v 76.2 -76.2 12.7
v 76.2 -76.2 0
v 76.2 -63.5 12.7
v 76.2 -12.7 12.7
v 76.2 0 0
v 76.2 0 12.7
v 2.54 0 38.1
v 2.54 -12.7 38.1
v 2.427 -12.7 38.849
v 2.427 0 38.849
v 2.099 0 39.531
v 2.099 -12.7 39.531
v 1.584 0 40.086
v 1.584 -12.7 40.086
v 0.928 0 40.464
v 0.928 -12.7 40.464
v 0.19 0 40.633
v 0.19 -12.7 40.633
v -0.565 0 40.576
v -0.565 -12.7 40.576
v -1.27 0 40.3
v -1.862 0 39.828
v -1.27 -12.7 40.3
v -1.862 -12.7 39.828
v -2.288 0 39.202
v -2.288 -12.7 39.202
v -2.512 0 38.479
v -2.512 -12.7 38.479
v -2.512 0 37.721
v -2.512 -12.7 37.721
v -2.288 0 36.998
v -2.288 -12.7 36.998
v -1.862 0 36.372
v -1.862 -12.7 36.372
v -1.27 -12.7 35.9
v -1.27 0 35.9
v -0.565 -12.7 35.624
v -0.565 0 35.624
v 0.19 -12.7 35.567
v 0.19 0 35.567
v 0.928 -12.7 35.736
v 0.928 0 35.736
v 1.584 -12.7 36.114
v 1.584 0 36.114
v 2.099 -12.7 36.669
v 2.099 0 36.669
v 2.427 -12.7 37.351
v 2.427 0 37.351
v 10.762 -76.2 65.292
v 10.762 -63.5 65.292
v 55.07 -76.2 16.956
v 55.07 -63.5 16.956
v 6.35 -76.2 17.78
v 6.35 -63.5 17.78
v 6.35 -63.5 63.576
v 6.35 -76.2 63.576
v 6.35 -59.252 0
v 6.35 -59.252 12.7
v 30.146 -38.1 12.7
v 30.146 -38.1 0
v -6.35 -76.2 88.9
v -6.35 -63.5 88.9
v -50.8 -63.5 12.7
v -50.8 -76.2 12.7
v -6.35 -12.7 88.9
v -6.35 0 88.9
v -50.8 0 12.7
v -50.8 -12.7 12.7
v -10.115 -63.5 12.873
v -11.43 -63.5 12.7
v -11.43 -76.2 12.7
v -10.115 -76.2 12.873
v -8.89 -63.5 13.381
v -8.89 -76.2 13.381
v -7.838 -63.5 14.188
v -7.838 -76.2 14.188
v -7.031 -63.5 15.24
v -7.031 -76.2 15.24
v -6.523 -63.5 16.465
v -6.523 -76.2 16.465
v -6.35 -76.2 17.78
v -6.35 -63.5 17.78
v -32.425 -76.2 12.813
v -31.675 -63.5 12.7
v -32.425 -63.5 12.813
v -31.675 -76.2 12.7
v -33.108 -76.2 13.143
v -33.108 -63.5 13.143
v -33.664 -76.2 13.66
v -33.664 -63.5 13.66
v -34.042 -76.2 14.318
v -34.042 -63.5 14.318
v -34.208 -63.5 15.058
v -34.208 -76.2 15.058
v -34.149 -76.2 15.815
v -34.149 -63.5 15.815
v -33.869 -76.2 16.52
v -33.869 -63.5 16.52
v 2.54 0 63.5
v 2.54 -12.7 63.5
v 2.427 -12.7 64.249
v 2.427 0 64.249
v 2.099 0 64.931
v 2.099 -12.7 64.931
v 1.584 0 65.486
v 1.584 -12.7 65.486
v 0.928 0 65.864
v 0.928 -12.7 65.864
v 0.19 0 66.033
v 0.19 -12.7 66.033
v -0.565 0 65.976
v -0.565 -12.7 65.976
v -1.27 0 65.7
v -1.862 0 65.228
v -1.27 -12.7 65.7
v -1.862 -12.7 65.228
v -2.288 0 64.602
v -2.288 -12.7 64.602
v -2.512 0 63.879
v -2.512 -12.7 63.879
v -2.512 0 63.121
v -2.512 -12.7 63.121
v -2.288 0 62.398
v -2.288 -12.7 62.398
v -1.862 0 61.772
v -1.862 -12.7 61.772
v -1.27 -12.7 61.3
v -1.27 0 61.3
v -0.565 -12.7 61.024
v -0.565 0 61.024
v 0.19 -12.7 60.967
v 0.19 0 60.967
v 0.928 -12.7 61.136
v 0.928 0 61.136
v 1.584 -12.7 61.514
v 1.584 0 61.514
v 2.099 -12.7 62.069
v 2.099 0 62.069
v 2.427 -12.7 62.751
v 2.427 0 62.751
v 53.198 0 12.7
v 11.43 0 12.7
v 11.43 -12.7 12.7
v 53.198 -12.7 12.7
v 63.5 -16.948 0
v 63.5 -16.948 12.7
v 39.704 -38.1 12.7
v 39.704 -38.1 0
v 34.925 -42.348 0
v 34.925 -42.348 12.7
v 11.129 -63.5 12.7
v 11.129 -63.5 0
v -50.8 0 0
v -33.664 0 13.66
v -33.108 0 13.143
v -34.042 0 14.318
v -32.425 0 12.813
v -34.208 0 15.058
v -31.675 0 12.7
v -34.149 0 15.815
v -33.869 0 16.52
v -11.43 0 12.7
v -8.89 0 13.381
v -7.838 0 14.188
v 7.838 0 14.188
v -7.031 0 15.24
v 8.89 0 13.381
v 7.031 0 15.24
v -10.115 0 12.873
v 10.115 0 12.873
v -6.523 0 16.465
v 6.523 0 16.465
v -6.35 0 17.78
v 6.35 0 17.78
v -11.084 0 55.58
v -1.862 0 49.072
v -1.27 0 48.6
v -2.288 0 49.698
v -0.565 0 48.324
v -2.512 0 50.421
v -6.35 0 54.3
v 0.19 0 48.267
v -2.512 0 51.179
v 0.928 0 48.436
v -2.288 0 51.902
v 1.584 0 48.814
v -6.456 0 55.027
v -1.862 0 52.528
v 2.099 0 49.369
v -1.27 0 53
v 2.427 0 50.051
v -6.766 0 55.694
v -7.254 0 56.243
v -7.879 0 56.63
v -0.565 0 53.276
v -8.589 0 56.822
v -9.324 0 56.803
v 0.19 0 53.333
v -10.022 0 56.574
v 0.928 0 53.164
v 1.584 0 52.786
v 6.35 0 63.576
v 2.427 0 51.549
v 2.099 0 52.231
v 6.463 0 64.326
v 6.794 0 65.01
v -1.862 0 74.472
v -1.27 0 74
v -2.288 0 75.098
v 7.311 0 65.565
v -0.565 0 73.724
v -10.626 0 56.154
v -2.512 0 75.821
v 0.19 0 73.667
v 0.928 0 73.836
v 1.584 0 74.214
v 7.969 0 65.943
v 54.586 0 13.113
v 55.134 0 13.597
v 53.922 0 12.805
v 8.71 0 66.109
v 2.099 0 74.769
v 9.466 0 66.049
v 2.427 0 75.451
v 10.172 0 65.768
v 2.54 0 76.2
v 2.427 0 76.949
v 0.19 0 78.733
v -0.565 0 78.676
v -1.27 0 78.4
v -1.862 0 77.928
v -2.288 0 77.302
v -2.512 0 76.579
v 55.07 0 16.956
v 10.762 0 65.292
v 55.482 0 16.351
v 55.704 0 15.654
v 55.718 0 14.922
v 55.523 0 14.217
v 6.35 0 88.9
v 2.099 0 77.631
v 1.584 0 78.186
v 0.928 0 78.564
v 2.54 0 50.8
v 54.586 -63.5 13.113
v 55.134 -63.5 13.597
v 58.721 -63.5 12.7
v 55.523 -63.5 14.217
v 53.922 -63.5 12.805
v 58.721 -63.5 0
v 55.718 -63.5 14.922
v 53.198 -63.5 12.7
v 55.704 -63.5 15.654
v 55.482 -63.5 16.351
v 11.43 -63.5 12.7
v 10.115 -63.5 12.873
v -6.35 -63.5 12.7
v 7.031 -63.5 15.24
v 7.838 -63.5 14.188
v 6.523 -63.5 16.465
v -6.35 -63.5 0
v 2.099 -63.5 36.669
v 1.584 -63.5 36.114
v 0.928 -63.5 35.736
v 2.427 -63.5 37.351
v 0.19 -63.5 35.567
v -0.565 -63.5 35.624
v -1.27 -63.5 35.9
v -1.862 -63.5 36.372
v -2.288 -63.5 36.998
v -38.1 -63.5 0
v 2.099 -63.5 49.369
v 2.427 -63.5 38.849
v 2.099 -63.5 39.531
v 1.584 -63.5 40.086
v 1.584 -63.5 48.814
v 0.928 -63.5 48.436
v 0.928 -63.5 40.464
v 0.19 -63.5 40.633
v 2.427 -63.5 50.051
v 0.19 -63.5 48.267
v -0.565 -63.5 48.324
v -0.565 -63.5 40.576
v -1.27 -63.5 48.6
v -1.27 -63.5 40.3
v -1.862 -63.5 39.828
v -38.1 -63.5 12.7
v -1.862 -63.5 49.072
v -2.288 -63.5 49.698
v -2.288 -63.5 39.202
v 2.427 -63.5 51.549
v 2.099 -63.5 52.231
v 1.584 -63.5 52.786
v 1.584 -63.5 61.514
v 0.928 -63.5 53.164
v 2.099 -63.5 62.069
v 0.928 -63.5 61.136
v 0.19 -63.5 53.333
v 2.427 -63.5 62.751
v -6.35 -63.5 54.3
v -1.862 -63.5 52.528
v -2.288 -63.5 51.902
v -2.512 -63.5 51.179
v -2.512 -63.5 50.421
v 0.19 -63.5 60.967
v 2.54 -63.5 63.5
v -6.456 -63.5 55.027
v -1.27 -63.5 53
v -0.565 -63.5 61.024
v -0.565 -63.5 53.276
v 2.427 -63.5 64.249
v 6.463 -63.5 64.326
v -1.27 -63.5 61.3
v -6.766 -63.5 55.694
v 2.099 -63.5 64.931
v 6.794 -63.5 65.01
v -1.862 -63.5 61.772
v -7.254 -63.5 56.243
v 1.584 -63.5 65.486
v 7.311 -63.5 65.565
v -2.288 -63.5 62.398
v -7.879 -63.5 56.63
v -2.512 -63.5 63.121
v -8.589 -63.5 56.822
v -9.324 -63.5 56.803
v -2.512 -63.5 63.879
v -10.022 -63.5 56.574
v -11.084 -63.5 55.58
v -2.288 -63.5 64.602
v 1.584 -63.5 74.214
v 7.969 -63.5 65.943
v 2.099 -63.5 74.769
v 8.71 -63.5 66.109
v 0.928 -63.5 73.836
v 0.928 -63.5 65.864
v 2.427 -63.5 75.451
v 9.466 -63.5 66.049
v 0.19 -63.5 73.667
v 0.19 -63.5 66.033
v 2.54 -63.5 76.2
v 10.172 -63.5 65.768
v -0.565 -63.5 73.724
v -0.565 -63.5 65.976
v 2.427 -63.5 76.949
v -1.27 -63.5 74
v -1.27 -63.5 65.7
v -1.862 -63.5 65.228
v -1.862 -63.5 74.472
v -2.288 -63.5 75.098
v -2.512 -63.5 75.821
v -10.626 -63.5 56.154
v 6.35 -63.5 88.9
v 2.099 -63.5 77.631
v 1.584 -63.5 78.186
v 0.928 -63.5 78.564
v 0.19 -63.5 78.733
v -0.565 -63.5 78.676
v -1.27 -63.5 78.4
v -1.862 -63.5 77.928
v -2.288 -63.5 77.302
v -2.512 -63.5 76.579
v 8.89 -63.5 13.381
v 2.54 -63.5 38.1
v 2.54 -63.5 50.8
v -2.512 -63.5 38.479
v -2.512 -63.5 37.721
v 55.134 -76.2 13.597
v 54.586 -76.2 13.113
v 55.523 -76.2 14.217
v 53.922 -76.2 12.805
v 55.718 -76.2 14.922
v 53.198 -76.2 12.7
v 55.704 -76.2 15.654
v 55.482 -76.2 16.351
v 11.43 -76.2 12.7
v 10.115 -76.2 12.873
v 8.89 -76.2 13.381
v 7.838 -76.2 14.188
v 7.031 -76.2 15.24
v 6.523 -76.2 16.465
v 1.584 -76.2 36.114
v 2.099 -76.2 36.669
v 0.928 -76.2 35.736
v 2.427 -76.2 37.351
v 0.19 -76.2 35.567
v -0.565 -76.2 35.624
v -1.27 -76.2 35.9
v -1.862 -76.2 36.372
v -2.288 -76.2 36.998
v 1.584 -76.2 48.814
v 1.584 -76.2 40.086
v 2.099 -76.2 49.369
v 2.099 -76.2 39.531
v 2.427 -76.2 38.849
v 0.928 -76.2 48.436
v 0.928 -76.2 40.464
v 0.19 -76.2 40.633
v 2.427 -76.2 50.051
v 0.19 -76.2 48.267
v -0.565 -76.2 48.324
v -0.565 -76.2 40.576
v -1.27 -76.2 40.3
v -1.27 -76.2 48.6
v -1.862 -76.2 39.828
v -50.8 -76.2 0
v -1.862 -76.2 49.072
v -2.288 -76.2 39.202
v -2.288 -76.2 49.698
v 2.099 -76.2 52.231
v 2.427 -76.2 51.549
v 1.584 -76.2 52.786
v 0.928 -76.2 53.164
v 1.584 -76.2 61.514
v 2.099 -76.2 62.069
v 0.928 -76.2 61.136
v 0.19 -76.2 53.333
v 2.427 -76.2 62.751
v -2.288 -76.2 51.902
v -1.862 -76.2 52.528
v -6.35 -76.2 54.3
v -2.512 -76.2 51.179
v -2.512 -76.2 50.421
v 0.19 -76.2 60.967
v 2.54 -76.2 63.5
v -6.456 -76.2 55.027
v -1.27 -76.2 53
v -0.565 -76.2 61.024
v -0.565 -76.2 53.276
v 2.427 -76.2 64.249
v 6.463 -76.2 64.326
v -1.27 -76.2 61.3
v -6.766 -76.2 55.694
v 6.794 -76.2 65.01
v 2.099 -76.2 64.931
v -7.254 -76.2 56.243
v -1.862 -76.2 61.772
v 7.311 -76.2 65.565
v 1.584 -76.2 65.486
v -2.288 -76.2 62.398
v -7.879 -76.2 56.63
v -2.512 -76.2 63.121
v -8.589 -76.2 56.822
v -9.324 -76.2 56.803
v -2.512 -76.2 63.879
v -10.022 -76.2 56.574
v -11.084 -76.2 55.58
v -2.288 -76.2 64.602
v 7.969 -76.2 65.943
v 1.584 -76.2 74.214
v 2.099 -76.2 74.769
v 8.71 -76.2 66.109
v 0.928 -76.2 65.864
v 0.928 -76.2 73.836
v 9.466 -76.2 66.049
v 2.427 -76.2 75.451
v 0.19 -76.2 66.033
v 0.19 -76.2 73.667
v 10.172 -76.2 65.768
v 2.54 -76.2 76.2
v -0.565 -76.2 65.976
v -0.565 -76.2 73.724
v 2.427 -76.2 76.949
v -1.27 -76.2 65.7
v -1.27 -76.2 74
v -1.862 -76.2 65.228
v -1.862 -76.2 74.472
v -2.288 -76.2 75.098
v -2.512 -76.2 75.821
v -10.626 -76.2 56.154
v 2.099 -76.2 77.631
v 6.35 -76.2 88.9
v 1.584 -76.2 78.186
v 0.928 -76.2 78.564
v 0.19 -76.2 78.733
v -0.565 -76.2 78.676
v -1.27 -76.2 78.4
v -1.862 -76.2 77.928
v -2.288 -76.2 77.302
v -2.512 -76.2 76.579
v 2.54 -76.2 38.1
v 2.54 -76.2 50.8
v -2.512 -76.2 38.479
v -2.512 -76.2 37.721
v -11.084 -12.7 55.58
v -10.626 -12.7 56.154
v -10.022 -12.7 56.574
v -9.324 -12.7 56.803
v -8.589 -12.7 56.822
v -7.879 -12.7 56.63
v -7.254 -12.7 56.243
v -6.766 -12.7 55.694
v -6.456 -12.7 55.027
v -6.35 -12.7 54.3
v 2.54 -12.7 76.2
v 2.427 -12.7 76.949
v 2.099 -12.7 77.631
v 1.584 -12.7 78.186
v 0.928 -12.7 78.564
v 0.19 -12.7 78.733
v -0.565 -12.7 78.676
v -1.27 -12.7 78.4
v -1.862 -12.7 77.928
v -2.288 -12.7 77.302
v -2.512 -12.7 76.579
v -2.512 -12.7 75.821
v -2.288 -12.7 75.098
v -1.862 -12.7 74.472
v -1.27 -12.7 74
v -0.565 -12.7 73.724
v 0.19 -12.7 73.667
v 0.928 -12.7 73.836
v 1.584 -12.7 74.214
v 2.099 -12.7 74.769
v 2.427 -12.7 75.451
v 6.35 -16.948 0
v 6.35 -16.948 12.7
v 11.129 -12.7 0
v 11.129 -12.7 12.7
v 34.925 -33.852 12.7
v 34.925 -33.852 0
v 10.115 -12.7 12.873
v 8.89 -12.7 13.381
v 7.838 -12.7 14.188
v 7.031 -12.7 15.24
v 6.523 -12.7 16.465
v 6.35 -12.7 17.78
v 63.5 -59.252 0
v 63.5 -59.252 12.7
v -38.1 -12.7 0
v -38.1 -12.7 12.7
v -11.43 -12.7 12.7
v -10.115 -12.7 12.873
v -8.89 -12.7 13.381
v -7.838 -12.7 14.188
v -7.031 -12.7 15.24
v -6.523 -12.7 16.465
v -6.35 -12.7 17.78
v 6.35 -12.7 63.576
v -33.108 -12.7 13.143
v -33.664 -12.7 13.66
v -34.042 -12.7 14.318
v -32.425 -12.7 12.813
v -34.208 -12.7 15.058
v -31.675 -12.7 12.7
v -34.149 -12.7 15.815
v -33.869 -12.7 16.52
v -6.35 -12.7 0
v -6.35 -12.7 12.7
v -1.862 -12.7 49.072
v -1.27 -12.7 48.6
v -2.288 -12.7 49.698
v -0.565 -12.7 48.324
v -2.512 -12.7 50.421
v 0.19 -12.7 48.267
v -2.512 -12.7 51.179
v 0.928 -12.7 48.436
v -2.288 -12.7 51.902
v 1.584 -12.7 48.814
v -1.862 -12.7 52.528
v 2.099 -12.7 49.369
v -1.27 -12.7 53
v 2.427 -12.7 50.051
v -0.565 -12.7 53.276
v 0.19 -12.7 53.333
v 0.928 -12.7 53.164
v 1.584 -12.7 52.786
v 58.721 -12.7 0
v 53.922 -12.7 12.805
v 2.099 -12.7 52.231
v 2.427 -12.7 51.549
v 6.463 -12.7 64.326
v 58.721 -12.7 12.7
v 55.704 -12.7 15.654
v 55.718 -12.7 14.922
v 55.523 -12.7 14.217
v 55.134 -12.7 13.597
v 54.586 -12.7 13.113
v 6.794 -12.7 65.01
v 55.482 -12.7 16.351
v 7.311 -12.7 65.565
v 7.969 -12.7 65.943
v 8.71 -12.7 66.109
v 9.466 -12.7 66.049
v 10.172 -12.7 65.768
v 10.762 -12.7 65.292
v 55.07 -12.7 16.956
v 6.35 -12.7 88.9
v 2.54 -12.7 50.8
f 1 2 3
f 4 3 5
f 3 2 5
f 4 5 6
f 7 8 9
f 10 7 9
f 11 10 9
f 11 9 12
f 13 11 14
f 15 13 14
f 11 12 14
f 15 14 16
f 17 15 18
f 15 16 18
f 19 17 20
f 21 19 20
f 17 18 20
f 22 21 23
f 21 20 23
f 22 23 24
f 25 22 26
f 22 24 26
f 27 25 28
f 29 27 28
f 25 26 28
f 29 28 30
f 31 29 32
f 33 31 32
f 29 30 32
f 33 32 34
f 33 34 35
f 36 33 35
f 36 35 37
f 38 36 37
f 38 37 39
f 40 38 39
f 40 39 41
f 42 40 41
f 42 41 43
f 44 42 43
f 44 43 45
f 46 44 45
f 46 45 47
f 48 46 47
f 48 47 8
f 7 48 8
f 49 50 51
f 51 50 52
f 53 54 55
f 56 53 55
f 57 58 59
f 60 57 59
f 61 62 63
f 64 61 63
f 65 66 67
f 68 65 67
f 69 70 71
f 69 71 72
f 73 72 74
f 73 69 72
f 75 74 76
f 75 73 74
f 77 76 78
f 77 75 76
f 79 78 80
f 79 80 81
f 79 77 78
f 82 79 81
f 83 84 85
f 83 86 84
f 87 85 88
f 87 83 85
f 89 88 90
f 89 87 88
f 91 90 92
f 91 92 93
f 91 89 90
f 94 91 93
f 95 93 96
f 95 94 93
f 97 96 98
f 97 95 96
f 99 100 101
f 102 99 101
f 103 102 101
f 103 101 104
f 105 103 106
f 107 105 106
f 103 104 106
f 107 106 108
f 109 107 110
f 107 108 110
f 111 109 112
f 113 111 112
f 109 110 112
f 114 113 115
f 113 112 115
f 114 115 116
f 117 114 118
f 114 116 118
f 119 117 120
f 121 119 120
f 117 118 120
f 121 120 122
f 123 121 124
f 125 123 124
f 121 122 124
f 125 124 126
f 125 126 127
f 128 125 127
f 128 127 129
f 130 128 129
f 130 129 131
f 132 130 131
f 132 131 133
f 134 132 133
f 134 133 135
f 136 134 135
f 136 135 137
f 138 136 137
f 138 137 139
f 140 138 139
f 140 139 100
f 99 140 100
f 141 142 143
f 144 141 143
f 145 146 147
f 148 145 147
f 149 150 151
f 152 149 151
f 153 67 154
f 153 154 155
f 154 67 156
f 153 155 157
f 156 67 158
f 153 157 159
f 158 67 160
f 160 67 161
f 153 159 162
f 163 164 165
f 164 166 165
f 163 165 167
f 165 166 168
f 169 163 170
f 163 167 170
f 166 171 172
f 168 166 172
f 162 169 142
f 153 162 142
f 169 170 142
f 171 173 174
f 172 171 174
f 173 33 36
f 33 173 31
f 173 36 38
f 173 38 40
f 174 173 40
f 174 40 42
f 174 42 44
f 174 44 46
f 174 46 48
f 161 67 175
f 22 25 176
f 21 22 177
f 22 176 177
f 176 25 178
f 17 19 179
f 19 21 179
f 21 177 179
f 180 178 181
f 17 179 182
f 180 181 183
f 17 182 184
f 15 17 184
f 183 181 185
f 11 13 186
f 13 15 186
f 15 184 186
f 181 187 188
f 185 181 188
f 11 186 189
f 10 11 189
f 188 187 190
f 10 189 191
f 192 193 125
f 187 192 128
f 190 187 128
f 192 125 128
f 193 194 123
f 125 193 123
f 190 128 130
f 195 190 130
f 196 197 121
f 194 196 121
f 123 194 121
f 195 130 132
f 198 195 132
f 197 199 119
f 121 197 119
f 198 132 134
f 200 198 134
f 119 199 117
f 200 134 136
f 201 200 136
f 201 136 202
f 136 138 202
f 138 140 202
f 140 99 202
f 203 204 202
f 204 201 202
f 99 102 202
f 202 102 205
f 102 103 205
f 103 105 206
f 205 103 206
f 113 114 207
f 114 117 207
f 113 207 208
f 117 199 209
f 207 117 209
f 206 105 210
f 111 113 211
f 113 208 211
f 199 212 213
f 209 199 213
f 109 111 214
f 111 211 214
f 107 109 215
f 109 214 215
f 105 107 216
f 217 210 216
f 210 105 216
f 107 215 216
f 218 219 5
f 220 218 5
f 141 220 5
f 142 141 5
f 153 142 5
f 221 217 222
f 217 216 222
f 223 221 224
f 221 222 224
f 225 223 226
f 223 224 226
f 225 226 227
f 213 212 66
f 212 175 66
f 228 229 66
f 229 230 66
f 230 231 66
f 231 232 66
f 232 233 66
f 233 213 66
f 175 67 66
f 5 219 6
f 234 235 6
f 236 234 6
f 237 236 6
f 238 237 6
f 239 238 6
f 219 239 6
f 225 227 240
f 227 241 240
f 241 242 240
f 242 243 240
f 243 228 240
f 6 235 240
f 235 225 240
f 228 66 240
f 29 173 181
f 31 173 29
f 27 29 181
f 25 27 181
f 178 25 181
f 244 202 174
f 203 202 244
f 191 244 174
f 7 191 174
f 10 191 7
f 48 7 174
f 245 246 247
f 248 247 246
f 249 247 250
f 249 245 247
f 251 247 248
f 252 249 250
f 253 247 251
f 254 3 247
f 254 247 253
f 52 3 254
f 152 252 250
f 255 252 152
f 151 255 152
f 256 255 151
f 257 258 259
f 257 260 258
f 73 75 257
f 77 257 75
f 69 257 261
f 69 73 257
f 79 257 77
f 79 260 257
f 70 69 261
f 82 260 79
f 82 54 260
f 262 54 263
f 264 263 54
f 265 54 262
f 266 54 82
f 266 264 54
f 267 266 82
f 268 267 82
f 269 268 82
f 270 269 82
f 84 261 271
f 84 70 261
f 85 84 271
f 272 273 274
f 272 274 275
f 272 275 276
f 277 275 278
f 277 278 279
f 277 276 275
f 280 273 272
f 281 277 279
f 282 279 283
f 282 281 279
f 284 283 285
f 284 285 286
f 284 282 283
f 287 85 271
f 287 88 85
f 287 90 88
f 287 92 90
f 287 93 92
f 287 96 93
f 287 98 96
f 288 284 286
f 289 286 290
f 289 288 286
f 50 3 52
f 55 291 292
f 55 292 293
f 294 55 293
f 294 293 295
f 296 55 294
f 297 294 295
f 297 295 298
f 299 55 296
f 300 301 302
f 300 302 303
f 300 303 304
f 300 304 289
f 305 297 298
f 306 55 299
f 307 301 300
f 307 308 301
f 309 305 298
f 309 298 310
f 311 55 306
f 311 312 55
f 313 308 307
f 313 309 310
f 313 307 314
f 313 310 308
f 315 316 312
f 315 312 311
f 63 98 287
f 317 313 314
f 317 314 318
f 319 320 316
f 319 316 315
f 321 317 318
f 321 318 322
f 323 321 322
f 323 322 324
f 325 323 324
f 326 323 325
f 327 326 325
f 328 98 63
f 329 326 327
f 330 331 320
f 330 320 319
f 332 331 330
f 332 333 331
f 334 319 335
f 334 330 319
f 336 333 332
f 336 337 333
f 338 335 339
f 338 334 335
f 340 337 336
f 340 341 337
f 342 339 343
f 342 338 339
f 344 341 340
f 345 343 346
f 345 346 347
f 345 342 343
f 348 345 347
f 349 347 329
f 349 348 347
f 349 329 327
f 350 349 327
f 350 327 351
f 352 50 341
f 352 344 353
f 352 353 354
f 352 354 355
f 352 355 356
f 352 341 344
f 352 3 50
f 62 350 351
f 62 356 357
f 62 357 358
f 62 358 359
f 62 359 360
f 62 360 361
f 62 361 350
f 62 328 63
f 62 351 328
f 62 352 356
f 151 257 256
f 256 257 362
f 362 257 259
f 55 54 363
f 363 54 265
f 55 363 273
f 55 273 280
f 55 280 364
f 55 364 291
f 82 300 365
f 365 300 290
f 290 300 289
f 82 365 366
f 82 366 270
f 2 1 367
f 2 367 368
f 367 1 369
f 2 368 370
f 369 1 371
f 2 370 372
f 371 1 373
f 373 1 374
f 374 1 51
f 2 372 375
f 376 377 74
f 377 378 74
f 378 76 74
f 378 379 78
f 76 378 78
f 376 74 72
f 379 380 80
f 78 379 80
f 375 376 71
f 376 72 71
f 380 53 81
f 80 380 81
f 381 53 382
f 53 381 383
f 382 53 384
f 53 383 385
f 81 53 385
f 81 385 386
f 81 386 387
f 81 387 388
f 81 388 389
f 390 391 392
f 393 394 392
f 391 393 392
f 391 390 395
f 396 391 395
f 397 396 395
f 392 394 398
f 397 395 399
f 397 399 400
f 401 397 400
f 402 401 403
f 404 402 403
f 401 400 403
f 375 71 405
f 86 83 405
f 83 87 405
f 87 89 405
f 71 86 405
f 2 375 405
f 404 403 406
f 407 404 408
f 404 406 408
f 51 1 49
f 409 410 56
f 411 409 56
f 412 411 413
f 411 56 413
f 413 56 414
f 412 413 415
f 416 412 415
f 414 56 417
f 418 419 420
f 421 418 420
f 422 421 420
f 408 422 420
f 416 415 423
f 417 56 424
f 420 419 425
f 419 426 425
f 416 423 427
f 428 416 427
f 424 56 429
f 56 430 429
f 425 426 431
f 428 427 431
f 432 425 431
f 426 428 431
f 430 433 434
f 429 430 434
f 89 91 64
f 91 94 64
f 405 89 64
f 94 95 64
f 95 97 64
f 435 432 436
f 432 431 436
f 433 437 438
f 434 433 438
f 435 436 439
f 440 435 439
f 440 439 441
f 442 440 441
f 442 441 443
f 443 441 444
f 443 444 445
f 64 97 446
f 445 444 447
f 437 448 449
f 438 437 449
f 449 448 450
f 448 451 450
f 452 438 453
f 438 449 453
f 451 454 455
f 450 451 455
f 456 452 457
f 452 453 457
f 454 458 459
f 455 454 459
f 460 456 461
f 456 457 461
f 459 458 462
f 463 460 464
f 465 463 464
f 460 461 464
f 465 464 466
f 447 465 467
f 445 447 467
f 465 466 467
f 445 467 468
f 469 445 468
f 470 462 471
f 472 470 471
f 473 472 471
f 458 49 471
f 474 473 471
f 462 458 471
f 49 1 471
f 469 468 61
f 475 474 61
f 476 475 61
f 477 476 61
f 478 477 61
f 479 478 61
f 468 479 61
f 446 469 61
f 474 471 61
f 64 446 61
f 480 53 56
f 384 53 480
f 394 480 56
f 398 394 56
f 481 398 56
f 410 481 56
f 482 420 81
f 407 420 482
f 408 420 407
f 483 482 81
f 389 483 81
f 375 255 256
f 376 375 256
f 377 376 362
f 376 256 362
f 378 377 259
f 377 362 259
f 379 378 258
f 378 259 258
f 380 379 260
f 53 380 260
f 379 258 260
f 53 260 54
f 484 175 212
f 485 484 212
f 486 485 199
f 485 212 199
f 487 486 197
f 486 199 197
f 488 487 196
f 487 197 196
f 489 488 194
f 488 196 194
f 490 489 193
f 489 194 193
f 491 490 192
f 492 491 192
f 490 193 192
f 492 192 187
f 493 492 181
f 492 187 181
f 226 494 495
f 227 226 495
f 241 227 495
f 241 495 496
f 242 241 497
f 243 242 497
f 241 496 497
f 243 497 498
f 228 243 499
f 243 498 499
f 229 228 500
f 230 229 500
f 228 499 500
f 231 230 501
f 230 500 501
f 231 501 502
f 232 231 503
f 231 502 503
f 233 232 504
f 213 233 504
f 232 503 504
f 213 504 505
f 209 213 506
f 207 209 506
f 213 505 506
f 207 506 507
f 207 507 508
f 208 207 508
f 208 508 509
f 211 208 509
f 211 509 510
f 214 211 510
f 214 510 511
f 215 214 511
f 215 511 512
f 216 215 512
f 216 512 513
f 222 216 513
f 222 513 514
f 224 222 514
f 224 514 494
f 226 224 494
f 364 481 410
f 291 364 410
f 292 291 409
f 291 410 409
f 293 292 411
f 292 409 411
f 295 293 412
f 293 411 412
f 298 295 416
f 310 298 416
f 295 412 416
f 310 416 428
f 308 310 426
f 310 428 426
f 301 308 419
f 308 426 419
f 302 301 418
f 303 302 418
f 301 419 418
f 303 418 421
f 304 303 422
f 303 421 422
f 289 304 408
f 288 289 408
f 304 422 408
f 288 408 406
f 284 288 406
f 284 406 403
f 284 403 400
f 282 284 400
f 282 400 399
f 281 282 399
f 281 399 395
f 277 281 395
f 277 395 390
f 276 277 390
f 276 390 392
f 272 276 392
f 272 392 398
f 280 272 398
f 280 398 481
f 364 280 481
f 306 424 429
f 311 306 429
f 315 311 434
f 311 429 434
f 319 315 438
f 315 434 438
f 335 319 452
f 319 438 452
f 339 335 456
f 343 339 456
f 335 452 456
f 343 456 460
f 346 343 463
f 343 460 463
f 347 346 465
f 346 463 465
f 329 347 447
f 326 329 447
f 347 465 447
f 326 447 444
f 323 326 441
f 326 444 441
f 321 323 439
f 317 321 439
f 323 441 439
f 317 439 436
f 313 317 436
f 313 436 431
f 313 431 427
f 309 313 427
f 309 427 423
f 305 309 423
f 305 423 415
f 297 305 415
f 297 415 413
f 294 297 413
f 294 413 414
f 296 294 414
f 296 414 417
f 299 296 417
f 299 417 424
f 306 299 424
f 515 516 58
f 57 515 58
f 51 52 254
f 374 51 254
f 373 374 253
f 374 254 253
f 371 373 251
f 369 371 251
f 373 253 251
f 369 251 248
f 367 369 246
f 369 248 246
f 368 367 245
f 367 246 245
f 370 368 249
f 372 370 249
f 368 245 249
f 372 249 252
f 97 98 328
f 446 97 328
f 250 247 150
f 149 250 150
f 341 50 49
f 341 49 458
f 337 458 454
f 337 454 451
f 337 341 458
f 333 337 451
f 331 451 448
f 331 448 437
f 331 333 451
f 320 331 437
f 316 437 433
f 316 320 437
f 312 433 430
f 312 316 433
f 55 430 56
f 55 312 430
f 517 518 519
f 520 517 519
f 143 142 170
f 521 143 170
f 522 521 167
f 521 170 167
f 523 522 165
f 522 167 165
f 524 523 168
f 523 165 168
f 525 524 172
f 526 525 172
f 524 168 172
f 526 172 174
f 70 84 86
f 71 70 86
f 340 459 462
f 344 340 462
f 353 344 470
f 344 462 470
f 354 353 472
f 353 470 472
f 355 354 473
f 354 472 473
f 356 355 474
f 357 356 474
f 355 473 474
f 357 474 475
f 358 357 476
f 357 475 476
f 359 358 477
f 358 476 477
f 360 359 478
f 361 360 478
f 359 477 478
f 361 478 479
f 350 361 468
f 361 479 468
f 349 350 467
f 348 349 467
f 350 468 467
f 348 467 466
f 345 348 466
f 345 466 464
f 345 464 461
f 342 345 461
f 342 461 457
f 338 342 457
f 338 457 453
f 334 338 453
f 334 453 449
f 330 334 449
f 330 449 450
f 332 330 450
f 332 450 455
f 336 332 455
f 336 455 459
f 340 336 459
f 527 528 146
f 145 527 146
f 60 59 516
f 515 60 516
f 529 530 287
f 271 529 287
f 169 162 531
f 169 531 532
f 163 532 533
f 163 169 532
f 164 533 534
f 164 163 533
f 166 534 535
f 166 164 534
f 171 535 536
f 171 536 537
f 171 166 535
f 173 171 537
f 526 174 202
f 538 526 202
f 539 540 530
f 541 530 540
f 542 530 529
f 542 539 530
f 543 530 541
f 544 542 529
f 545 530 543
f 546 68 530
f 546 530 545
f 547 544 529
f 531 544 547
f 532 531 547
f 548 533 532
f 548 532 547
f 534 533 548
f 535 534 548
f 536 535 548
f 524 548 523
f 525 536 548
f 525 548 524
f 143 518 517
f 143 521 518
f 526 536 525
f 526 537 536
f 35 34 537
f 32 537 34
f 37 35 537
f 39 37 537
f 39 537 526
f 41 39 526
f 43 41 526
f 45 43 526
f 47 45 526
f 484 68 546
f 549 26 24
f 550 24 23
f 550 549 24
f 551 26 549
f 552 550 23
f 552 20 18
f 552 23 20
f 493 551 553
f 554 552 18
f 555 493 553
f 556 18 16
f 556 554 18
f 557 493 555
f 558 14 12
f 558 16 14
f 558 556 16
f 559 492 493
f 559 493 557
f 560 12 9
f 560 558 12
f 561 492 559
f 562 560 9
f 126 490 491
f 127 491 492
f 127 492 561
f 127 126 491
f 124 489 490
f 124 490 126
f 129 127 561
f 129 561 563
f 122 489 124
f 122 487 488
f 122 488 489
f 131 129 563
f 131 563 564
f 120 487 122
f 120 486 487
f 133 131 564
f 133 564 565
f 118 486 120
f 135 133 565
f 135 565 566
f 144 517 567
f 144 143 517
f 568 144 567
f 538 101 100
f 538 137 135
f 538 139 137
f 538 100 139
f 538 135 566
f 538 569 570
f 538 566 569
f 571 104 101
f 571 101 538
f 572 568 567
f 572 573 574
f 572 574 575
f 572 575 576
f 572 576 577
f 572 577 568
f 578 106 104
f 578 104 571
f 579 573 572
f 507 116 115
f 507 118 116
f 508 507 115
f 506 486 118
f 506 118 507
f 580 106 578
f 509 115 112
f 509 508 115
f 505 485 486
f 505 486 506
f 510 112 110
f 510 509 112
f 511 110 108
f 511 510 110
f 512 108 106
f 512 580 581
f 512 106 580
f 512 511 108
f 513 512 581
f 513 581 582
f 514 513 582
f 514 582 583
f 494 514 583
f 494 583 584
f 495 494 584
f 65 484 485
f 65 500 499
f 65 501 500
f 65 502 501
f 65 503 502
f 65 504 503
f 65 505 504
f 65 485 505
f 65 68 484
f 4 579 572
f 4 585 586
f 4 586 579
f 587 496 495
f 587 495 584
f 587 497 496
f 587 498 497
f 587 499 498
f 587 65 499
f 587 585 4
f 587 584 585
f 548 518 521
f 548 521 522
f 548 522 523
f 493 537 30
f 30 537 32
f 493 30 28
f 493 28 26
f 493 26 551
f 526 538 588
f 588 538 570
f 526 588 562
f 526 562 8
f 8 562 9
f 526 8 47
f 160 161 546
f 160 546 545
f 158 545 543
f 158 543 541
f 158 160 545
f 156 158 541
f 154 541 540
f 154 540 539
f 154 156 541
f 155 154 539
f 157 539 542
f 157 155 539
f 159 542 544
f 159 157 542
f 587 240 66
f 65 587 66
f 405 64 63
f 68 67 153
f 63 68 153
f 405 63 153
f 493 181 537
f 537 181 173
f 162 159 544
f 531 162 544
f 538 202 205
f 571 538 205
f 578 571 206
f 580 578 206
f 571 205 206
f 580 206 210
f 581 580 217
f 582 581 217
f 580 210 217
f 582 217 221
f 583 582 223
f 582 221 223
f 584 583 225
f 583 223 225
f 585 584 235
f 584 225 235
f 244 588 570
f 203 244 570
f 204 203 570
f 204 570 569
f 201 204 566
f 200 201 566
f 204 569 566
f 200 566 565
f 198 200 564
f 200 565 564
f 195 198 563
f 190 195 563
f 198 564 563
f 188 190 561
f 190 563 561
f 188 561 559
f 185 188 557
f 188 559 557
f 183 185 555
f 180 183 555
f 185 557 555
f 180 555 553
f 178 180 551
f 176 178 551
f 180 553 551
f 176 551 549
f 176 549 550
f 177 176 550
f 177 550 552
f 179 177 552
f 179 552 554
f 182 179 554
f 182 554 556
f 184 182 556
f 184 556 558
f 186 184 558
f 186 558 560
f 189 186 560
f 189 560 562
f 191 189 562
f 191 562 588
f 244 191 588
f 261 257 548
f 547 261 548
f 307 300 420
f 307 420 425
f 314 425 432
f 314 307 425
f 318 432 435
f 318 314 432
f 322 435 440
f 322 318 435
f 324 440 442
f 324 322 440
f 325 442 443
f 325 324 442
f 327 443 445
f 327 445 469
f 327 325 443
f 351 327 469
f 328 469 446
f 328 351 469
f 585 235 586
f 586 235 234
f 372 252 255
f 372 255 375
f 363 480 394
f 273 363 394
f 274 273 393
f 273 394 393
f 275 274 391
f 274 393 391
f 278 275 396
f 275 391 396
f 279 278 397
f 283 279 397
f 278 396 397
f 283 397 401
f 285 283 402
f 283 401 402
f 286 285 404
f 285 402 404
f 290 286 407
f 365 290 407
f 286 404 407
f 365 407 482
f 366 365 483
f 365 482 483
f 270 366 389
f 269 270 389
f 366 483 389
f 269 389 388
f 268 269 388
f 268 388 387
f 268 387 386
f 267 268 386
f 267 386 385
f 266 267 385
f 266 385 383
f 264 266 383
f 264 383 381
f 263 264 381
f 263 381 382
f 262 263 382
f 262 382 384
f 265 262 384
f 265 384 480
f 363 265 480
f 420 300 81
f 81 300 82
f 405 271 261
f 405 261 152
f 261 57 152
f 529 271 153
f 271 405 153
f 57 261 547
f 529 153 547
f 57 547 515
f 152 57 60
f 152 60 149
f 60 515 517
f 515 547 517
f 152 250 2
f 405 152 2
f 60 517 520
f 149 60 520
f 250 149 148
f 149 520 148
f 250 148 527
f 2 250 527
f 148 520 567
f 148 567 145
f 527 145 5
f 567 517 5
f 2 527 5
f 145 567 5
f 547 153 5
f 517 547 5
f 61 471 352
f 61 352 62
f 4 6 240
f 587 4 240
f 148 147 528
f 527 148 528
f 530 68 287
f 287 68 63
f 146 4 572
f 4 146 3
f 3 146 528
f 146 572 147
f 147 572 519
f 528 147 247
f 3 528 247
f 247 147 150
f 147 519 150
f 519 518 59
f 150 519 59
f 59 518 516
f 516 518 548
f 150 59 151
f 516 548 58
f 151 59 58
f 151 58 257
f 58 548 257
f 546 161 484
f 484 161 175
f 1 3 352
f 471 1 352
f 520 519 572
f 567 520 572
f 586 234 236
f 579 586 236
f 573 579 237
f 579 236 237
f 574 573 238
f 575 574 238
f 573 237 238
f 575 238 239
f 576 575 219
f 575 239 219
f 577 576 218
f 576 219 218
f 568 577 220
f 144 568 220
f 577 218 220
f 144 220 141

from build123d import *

# Parameters (mm, degrees)
F0_R        = 2.2479
F1_DEPTH    = 76.2
F2_W        = 50.8
F2_H        = 76.2
F3_DEPTH    = 254
F5_DEPTH    = 25.4
F6_T1_DEPTH = 12.7
F6_T3_DEPTH = 12.7
F7_T1_DEPTH = 12.7
F7_T3_DEPTH = 12.7
F8_R        = 2.54
F9_R        = 2.54
F10_DEPTH   = 254


# Not quite as in the source:
# - a fillet or chamfer that OpenCascade refuses, or shapes differently, is made with other operations: its cross-section is extruded or revolved along the edge and cut away or added


with BuildPart() as f1:
    # F0 (on Front) → F1 (new body)
    with BuildSketch(Plane.XZ):
        Polygon((-50.8, 0), (0, 0), (76.2, 0), (76.2, 12.7), (6.35, 88.9), (-6.35, 88.9), (-50.8, 12.7), align=None)
        Polygon((-6.35, 12.7), (-36.0971634445, 12.7), (-6.35, 63.6951373334), align=None, mode=Mode.SUBTRACT)
        with Locations((0, 38.1)):
            Circle(F0_R, mode=Mode.SUBTRACT)
        Polygon((6.35, 12.7), (6.35, 70.1053616754), (58.9715815358, 12.7), align=None, mode=Mode.SUBTRACT)
        with Locations((0, 50.8)):
            Circle(F0_R, mode=Mode.SUBTRACT)
        with Locations((0, 63.5)):
            Circle(F0_R, mode=Mode.SUBTRACT)
        with Locations((0, 76.2)):
            Circle(F0_R, mode=Mode.SUBTRACT)
    extrude(amount=F1_DEPTH)

    # F2 (on face) → F3 (cut)
    with BuildSketch(Plane(origin=(-50.8, 0, 0), x_dir=(0, -1, 0), z_dir=(-1, 0, 0))):
        with Locations((38.1, 50.8)):
            Rectangle(F2_W, F2_H)
    extrude(amount=-F3_DEPTH, mode=Mode.SUBTRACT)

    # F4 (on face) → F5 (cut)
    with BuildSketch(Plane.XY.offset(12.7)):
        Polygon((58.7209921515, -12.7), (11.1290078485, -12.7), (34.925, -33.8519930236), align=None)
        Polygon((34.925, -42.3480069764), (11.1290078485, -63.5), (58.7209921515, -63.5), align=None)
        Polygon((-36.0971634445, -12.7), (-38.1, -12.7), (-38.1, -63.5), (-36.0971634445, -63.5), (-6.35, -63.5), (-6.35, -12.7), align=None)
        Polygon((30.1459921515, -38.1), (6.35, -16.9480069764), (6.35, -59.2519930236), align=None)
        Polygon((63.5, -59.2519930236), (63.5, -16.9480069764), (39.7040078485, -38.1), align=None)
    extrude(amount=-F5_DEPTH, mode=Mode.SUBTRACT)

    # F6: fillet of radius 5.08 on 4 edges, made by hand

    # F6_s2 → F6_t1 (join)
    with BuildSketch(Plane.XZ.offset(63.5)):
        with BuildLine():
            ThreePointArc((-11.43, 12.7), (-7.8378975516, 14.1878975516), (-6.35, 17.78))
            Line((-6.35, 17.78), (-6.35, 12.7))
            Line((-6.35, 12.7), (-11.43, 12.7))
        make_face()
        with BuildLine():
            ThreePointArc((11.43, 12.7), (7.8378975516, 14.1878975516), (6.35, 17.78))
            Line((6.35, 17.78), (6.35, 12.7))
            Line((6.35, 12.7), (11.43, 12.7))
        make_face()
    extrude(amount=F6_T1_DEPTH)

    # F6_s4 → F6_t3 (join)
    with BuildSketch(Plane.XZ):
        with BuildLine():
            ThreePointArc((-11.43, 12.7), (-7.8378975516, 14.1878975516), (-6.35, 17.78))
            Line((-6.35, 17.78), (-6.35, 12.7))
            Line((-6.35, 12.7), (-11.43, 12.7))
        make_face()
        with BuildLine():
            ThreePointArc((11.43, 12.7), (7.8378975516, 14.1878975516), (6.35, 17.78))
            Line((6.35, 17.78), (6.35, 12.7))
            Line((6.35, 12.7), (11.43, 12.7))
        make_face()
    extrude(amount=F6_T3_DEPTH)

    # F7: fillet of radius 2.54 on 7 edges, made by hand

    # F7_s2 → F7_t1 (join)
    with BuildSketch(Plane.XZ.offset(63.5)):
        with BuildLine():
            ThreePointArc((-6.35, 54.2998790858), (-8.2271108528, 56.751853388), (-11.0839984083, 55.5797114907))
            Line((-11.0839984083, 55.5797114907), (-6.35, 63.6951373334))
            Line((-6.35, 63.6951373334), (-6.35, 54.2998790858))
        make_face()
        with BuildLine():
            ThreePointArc((55.0699360257, 16.9563405564), (55.5225489196, 14.2172353676), (53.1975645096, 12.7))
            Line((53.1975645096, 12.7), (58.9715815358, 12.7))
            Line((58.9715815358, 12.7), (55.0699360257, 16.9563405564))
        make_face()
        with BuildLine():
            ThreePointArc((10.7623715161, 65.291865476), (7.9691915647, 65.9427409692), (6.35, 63.5755249196))
            Line((6.35, 63.5755249196), (6.35, 70.1053616754))
            Line((6.35, 70.1053616754), (10.7623715161, 65.291865476))
        make_face()
    extrude(amount=F7_T1_DEPTH)

    # F7_s4 → F7_t3 (join)
    with BuildSketch(Plane.XZ):
        with BuildLine():
            ThreePointArc((6.35, 63.5755249196), (7.9691915647, 65.9427409692), (10.7623715161, 65.291865476))
            Line((10.7623715161, 65.291865476), (6.35, 70.1053616754))
            Line((6.35, 70.1053616754), (6.35, 63.5755249196))
        make_face()
        with BuildLine():
            ThreePointArc((-11.0839984083, 55.5797114907), (-8.2271108528, 56.751853388), (-6.35, 54.2998790858))
            Line((-6.35, 54.2998790858), (-6.35, 63.6951373334))
            Line((-6.35, 63.6951373334), (-11.0839984083, 55.5797114907))
        make_face()
        with BuildLine():
            ThreePointArc((55.0699360257, 16.9563405564), (55.5225489196, 14.2172353676), (53.1975645096, 12.7))
            Line((53.1975645096, 12.7), (58.9715815358, 12.7))
            Line((58.9715815358, 12.7), (55.0699360257, 16.9563405564))
        make_face()
        with BuildLine():
            ThreePointArc((-33.868927875, 16.5198324048), (-33.8774705343, 13.9749257548), (-31.6749294667, 12.7))
            Line((-31.6749294667, 12.7), (-36.0971634445, 12.7))
            Line((-36.0971634445, 12.7), (-33.868927875, 16.5198324048))
        make_face()
    extrude(amount=F7_T3_DEPTH)

    # F8
    f8_edges = [f1.edges().sort_by_distance(p)[0] for p in [
        (-36.097163, -69.85, 12.7),
    ]]
    fillet(f8_edges, radius=F8_R)

    # F9 (on face) → F10 (cut)
    with BuildSketch(Plane.XZ.offset(76.2)):
        with Locations((0, 76.2)):
            Circle(F9_R)
        with Locations((0, 63.5)):
            Circle(F9_R)
        with Locations((0, 50.8)):
            Circle(F9_R)
        with Locations((0, 38.1)):
            Circle(F9_R)
    extrude(amount=-F10_DEPTH, mode=Mode.SUBTRACT)


solid = f1.part
